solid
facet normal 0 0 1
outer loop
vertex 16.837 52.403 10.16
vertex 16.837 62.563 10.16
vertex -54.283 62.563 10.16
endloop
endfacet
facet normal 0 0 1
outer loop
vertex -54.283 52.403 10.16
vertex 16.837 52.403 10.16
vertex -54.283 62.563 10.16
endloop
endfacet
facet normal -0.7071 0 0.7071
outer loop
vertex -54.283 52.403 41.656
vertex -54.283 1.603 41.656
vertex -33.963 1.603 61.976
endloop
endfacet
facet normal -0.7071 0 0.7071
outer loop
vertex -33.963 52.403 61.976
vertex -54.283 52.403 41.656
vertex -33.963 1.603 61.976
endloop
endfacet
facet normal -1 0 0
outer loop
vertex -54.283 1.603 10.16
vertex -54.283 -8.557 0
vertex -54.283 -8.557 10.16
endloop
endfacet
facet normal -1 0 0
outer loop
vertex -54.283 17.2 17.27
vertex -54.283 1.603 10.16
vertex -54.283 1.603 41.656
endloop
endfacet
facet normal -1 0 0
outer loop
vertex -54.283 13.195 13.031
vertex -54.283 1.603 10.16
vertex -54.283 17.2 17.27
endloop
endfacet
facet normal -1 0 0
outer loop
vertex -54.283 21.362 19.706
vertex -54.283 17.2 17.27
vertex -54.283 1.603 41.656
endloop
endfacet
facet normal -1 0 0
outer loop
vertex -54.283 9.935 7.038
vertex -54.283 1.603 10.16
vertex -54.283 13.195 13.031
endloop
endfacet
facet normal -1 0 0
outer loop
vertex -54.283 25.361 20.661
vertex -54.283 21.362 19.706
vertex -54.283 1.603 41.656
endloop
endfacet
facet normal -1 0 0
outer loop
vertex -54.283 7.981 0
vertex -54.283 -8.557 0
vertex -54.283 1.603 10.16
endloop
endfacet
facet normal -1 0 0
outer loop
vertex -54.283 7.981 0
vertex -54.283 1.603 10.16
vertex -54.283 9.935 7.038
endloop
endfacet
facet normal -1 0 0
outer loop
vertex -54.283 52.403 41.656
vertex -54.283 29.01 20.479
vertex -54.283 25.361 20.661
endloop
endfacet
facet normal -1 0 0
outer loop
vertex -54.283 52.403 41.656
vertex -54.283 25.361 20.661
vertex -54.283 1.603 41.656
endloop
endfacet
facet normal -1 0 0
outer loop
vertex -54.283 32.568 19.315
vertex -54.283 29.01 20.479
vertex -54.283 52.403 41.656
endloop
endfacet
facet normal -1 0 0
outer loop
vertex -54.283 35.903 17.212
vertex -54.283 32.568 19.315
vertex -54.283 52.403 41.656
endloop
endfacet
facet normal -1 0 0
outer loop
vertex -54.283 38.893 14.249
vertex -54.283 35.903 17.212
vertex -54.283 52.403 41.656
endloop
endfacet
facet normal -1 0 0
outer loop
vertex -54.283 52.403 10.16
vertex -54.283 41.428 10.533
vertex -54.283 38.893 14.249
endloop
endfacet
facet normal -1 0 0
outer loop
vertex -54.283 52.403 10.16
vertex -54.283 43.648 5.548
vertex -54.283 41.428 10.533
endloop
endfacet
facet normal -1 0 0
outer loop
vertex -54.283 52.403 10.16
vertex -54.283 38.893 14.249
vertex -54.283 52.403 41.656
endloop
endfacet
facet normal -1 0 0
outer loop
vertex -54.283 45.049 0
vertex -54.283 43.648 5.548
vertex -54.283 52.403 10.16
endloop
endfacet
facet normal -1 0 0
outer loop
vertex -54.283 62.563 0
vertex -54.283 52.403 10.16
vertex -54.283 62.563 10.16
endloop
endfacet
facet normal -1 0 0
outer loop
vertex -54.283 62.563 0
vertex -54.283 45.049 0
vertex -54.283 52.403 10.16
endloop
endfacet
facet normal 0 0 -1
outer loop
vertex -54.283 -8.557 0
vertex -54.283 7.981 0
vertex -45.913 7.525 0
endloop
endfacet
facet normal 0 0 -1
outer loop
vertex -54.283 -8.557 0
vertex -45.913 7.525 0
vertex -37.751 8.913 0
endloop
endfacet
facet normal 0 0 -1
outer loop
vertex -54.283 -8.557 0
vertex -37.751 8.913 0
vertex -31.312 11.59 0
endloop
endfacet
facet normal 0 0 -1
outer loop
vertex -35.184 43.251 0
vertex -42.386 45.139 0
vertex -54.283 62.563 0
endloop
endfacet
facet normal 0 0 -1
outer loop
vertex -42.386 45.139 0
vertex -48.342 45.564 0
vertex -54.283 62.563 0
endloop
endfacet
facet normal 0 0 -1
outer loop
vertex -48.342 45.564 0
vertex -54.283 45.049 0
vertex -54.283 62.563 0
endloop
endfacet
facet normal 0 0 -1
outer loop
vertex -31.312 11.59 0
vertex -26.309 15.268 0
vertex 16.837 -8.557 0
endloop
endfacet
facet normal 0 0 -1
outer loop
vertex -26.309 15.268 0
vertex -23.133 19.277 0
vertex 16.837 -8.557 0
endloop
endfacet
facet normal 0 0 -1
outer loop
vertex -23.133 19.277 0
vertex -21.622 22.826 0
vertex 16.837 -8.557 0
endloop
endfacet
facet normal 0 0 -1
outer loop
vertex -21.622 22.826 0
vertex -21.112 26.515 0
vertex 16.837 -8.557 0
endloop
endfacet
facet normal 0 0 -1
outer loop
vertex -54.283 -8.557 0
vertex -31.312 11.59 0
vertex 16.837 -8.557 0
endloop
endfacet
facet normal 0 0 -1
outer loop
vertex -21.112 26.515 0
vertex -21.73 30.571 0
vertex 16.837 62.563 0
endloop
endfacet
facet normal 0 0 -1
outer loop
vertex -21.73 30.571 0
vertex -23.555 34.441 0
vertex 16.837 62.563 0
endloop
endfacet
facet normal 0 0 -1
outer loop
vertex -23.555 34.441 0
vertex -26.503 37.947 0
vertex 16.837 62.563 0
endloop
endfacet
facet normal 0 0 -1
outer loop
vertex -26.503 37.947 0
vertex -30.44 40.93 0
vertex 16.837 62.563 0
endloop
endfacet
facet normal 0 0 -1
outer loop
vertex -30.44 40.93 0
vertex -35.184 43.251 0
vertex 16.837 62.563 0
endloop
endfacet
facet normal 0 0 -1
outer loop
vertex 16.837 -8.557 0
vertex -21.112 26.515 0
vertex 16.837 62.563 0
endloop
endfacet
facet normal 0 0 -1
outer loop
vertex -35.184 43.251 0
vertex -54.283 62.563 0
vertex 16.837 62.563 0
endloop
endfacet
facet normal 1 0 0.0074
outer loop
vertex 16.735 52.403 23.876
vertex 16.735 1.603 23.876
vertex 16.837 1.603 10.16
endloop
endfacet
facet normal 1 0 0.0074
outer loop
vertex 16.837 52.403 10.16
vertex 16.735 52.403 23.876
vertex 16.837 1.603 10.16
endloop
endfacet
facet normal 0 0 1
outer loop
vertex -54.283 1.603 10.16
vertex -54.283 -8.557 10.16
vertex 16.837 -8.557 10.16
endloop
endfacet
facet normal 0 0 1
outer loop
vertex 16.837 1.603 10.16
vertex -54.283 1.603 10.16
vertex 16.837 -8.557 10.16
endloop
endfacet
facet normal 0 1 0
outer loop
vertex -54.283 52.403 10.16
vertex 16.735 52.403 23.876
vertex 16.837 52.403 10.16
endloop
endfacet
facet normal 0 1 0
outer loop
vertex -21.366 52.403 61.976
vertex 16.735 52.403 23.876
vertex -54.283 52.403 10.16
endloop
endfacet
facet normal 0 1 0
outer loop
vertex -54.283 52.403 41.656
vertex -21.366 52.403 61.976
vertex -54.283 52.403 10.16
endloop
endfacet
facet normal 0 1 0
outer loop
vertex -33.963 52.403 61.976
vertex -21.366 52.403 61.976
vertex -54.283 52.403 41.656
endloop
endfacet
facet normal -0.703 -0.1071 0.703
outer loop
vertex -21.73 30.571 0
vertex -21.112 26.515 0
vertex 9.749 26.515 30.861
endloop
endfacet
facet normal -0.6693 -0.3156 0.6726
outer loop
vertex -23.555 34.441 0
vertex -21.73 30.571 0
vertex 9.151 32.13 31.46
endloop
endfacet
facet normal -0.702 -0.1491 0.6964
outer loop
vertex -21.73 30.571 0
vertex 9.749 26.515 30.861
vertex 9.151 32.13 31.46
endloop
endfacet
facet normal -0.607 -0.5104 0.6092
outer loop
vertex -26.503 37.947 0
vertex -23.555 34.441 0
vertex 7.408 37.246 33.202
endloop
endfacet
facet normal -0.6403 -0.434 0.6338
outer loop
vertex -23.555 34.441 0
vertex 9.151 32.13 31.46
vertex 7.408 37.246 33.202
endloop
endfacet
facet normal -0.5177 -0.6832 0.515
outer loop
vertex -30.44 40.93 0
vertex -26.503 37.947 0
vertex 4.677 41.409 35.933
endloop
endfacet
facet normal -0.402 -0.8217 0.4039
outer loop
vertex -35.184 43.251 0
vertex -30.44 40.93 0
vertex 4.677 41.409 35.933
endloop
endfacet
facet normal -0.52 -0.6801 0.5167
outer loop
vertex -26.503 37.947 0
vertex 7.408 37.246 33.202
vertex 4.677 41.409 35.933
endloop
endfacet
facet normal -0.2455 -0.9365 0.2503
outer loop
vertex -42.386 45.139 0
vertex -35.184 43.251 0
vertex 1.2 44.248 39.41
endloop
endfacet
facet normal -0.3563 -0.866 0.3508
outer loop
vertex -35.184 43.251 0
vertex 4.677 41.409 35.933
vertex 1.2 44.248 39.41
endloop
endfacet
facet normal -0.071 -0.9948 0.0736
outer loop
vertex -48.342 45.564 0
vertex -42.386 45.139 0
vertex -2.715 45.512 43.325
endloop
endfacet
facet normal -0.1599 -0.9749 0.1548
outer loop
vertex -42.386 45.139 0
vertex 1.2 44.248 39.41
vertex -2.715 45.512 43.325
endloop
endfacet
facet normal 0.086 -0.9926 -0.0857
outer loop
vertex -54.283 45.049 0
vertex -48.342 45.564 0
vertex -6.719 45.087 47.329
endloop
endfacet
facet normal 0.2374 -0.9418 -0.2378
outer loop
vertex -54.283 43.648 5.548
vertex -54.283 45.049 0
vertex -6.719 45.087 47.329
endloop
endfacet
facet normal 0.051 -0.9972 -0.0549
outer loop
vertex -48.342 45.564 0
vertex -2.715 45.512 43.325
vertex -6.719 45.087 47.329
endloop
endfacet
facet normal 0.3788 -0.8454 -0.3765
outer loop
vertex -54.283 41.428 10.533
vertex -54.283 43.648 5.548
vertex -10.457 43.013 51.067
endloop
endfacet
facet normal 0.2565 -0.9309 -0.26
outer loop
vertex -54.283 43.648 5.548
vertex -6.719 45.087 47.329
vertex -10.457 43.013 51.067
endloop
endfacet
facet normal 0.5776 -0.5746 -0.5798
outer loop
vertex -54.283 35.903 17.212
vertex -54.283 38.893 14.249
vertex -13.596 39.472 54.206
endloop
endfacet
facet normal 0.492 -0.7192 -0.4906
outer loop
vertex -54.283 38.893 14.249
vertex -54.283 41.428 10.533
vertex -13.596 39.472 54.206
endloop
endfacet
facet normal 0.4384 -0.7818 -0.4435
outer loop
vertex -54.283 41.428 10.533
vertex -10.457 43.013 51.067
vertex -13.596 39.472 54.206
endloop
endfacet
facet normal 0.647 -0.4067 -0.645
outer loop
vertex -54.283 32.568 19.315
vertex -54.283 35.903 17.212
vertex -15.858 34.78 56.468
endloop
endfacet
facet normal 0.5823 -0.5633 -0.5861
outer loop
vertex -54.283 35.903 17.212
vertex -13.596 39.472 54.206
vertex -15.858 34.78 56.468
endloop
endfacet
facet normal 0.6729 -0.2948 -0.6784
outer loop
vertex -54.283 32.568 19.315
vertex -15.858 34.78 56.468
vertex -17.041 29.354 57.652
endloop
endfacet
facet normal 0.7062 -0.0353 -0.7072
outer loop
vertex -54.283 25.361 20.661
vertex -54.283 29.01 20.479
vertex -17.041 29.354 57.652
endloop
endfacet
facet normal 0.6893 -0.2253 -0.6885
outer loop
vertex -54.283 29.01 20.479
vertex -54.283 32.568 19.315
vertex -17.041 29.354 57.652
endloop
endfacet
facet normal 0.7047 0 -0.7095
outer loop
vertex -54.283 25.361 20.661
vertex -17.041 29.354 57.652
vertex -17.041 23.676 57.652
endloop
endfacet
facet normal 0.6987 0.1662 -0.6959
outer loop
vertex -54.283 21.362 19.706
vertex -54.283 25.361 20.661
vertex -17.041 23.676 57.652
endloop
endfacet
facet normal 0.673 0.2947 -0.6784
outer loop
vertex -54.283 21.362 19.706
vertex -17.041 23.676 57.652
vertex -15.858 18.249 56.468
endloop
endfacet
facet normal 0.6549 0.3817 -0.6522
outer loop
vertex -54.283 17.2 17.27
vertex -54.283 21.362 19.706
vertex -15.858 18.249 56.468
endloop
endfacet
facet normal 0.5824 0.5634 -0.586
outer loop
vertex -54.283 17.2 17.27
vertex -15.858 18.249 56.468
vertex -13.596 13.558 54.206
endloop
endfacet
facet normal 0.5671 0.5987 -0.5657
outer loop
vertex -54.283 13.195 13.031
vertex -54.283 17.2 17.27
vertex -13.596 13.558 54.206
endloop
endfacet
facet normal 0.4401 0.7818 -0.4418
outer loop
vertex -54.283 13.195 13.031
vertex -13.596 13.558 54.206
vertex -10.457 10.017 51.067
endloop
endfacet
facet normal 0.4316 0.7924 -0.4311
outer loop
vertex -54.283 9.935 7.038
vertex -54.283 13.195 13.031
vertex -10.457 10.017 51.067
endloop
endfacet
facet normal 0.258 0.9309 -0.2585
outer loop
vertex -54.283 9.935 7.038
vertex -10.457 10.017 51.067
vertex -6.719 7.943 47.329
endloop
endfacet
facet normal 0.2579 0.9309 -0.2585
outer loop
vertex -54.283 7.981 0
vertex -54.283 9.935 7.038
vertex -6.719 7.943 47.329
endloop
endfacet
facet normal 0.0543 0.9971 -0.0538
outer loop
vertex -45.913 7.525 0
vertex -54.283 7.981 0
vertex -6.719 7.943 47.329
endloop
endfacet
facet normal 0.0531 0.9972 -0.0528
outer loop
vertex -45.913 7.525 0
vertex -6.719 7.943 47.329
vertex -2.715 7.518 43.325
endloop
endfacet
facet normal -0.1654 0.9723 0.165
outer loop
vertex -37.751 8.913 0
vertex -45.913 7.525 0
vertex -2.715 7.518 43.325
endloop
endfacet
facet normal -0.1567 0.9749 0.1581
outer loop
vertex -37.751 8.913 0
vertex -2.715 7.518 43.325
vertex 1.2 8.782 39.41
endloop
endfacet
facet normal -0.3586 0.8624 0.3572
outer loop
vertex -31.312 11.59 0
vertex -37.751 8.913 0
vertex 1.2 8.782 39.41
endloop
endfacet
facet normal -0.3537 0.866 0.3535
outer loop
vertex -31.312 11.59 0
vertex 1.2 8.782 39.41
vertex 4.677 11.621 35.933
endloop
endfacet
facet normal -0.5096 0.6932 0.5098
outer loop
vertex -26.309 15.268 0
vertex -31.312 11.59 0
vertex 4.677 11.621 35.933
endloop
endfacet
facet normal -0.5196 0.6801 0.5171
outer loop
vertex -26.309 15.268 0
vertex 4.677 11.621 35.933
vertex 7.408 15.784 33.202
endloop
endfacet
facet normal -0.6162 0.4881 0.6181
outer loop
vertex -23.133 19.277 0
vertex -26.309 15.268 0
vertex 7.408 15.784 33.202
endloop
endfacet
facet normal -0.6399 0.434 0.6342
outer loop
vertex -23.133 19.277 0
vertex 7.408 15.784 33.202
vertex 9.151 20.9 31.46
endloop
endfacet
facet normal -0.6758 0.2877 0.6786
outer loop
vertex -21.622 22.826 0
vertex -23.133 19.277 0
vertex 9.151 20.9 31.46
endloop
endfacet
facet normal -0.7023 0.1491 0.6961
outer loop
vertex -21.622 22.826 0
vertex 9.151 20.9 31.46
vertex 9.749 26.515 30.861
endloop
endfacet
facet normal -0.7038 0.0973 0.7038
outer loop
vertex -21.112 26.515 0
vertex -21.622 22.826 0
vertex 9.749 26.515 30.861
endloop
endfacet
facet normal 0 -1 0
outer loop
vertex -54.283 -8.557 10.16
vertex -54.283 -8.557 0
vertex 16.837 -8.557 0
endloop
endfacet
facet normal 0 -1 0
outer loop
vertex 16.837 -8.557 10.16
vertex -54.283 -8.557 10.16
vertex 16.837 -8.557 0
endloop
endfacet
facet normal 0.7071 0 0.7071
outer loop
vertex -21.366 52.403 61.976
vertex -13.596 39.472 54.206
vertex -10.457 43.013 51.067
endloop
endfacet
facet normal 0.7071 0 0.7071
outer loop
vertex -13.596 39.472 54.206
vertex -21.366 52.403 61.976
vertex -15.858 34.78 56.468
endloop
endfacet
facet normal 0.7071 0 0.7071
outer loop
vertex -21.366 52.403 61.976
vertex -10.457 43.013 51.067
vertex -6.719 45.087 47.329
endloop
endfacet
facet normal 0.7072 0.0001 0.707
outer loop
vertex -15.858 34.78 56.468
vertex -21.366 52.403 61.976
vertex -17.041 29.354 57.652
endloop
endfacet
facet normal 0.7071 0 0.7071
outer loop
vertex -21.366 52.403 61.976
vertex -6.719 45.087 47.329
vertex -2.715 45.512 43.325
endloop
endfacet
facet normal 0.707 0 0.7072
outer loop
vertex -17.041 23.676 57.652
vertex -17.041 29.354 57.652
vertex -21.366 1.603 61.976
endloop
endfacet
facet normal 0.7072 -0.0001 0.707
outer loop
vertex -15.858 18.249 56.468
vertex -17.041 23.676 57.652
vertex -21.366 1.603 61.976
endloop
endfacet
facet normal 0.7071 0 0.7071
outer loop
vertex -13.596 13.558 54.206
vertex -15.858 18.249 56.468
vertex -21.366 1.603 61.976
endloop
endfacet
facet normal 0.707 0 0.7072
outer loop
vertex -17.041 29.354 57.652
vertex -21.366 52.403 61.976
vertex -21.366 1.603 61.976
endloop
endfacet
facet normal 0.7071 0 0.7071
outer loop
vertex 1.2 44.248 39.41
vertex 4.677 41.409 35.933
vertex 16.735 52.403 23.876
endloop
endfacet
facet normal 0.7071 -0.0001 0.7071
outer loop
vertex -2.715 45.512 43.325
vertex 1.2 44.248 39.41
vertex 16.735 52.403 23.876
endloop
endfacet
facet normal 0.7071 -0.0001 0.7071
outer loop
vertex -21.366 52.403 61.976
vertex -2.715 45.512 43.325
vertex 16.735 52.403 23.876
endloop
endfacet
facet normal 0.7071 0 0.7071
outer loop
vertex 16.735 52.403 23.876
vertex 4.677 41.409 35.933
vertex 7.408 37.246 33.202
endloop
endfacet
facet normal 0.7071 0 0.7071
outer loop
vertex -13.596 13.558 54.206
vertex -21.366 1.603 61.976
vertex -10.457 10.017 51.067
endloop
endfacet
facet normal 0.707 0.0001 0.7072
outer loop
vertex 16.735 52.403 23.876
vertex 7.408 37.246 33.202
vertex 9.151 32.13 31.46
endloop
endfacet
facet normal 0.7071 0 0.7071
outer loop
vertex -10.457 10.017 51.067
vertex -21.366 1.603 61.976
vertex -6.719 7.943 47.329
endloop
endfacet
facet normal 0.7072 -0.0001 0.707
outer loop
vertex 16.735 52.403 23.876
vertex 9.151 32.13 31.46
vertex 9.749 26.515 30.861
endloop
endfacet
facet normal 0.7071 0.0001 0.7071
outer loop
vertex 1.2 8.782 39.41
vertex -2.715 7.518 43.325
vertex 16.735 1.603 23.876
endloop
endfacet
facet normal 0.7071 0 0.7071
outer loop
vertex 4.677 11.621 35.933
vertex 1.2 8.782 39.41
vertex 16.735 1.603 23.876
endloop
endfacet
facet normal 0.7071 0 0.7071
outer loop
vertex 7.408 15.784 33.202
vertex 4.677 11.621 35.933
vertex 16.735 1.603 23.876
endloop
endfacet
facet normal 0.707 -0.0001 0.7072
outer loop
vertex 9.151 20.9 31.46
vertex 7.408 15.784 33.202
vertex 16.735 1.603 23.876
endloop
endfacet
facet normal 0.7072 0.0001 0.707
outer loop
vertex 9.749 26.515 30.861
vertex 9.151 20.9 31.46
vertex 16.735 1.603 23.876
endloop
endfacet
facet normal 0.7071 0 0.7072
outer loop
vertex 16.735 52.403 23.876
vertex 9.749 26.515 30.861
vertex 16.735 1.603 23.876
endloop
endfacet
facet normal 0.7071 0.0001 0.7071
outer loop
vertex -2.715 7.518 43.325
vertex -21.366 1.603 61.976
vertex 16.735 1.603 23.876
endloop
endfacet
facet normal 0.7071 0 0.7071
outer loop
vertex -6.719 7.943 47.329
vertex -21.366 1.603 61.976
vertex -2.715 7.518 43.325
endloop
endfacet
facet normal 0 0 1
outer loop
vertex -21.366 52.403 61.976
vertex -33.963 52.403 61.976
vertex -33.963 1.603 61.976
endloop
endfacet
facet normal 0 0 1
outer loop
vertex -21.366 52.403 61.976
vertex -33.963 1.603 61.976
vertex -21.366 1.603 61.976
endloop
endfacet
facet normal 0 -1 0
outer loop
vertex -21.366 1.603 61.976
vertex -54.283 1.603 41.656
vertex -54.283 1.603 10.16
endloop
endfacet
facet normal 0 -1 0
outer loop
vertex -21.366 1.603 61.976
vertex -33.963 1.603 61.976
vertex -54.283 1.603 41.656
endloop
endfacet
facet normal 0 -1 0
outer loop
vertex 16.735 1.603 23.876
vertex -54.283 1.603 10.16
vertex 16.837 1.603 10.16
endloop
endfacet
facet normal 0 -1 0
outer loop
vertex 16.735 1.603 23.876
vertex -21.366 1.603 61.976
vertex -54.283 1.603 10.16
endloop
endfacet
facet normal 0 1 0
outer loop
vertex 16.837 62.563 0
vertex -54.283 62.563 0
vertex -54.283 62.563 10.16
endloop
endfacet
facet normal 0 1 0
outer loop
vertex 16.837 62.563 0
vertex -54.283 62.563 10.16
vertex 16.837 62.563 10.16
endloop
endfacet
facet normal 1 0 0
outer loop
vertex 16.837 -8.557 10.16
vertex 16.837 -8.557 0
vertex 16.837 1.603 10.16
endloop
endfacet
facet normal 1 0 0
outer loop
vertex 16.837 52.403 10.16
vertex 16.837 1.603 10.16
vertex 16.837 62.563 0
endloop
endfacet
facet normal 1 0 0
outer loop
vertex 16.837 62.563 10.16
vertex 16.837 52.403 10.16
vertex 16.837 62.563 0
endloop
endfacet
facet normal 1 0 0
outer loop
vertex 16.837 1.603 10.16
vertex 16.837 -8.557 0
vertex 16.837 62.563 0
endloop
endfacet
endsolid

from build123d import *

# Parameters (mm, degrees)
F0_W      = 71.12
F0_H      = 71.12
F1_DEPTH  = 61.976
F2_W      = 71.12
F2_H      = 51.816
F3_DEPTH  = 10.16
F4_W      = 71.12
F4_H      = 51.816
F5_DEPTH  = 10.16
F7_DEPTH  = 76.2
F9_DEPTH  = 76.2
F10_R     = 19.05
F11_DEPTH = 76.2


with BuildPart() as f1:
    # F0 (on Top) → F1 (new body)
    with BuildSketch(Plane.XY):
        with Locations((-18.7232699245, 27.0034961376)):
            Rectangle(F0_W, F0_H)
    extrude(amount=F1_DEPTH)

    # F2 (on face) → F3 (cut)
    with BuildSketch(Plane.XZ.offset(8.5565038624)):
        with Locations((-18.7232699245, 36.068)):
            Rectangle(F2_W, F2_H)
    extrude(amount=-F3_DEPTH, mode=Mode.SUBTRACT)

    # F4 (on face) → F5 (cut)
    with BuildSketch(Plane(origin=(0, 62.5634961376, 0), x_dir=(-1, 0, 0), z_dir=(0, 1, 0))):
        with Locations((18.7232699245, 36.068)):
            Rectangle(F4_W, F4_H)
    extrude(amount=-F5_DEPTH, mode=Mode.SUBTRACT)

    # F6 (on face) → F7 (cut)
    with BuildSketch(Plane.XZ.offset(-1.6034961376)):
        Polygon((-33.9632699245, 61.976), (-54.2832699245, 61.976), (-54.2832699245, 41.656), align=None)
    extrude(amount=-F7_DEPTH, mode=Mode.SUBTRACT)

    # F8 (on face) → F9 (cut)
    with BuildSketch(Plane.XZ.offset(-1.6034961376)):
        Polygon((-21.3656260499, 61.976), (16.7347530496, 23.8756209005), (16.8367300755, 10.16), (16.8367300755, 61.976), align=None)
    extrude(amount=-F9_DEPTH, mode=Mode.SUBTRACT)

    # F10 (on face) → F11 (cut)
    with BuildSketch(Plane(origin=(20.3051869751, 0, 20.3051869751), x_dir=(0.7071067812, 0, -0.7071067812), z_dir=(0.7071067812, 0, 0.7071067812))):
        with Locations((-33.9787192643, 26.5149436891)):
            Circle(F10_R)
    extrude(amount=-F11_DEPTH, mode=Mode.SUBTRACT)


solid = f1.part
